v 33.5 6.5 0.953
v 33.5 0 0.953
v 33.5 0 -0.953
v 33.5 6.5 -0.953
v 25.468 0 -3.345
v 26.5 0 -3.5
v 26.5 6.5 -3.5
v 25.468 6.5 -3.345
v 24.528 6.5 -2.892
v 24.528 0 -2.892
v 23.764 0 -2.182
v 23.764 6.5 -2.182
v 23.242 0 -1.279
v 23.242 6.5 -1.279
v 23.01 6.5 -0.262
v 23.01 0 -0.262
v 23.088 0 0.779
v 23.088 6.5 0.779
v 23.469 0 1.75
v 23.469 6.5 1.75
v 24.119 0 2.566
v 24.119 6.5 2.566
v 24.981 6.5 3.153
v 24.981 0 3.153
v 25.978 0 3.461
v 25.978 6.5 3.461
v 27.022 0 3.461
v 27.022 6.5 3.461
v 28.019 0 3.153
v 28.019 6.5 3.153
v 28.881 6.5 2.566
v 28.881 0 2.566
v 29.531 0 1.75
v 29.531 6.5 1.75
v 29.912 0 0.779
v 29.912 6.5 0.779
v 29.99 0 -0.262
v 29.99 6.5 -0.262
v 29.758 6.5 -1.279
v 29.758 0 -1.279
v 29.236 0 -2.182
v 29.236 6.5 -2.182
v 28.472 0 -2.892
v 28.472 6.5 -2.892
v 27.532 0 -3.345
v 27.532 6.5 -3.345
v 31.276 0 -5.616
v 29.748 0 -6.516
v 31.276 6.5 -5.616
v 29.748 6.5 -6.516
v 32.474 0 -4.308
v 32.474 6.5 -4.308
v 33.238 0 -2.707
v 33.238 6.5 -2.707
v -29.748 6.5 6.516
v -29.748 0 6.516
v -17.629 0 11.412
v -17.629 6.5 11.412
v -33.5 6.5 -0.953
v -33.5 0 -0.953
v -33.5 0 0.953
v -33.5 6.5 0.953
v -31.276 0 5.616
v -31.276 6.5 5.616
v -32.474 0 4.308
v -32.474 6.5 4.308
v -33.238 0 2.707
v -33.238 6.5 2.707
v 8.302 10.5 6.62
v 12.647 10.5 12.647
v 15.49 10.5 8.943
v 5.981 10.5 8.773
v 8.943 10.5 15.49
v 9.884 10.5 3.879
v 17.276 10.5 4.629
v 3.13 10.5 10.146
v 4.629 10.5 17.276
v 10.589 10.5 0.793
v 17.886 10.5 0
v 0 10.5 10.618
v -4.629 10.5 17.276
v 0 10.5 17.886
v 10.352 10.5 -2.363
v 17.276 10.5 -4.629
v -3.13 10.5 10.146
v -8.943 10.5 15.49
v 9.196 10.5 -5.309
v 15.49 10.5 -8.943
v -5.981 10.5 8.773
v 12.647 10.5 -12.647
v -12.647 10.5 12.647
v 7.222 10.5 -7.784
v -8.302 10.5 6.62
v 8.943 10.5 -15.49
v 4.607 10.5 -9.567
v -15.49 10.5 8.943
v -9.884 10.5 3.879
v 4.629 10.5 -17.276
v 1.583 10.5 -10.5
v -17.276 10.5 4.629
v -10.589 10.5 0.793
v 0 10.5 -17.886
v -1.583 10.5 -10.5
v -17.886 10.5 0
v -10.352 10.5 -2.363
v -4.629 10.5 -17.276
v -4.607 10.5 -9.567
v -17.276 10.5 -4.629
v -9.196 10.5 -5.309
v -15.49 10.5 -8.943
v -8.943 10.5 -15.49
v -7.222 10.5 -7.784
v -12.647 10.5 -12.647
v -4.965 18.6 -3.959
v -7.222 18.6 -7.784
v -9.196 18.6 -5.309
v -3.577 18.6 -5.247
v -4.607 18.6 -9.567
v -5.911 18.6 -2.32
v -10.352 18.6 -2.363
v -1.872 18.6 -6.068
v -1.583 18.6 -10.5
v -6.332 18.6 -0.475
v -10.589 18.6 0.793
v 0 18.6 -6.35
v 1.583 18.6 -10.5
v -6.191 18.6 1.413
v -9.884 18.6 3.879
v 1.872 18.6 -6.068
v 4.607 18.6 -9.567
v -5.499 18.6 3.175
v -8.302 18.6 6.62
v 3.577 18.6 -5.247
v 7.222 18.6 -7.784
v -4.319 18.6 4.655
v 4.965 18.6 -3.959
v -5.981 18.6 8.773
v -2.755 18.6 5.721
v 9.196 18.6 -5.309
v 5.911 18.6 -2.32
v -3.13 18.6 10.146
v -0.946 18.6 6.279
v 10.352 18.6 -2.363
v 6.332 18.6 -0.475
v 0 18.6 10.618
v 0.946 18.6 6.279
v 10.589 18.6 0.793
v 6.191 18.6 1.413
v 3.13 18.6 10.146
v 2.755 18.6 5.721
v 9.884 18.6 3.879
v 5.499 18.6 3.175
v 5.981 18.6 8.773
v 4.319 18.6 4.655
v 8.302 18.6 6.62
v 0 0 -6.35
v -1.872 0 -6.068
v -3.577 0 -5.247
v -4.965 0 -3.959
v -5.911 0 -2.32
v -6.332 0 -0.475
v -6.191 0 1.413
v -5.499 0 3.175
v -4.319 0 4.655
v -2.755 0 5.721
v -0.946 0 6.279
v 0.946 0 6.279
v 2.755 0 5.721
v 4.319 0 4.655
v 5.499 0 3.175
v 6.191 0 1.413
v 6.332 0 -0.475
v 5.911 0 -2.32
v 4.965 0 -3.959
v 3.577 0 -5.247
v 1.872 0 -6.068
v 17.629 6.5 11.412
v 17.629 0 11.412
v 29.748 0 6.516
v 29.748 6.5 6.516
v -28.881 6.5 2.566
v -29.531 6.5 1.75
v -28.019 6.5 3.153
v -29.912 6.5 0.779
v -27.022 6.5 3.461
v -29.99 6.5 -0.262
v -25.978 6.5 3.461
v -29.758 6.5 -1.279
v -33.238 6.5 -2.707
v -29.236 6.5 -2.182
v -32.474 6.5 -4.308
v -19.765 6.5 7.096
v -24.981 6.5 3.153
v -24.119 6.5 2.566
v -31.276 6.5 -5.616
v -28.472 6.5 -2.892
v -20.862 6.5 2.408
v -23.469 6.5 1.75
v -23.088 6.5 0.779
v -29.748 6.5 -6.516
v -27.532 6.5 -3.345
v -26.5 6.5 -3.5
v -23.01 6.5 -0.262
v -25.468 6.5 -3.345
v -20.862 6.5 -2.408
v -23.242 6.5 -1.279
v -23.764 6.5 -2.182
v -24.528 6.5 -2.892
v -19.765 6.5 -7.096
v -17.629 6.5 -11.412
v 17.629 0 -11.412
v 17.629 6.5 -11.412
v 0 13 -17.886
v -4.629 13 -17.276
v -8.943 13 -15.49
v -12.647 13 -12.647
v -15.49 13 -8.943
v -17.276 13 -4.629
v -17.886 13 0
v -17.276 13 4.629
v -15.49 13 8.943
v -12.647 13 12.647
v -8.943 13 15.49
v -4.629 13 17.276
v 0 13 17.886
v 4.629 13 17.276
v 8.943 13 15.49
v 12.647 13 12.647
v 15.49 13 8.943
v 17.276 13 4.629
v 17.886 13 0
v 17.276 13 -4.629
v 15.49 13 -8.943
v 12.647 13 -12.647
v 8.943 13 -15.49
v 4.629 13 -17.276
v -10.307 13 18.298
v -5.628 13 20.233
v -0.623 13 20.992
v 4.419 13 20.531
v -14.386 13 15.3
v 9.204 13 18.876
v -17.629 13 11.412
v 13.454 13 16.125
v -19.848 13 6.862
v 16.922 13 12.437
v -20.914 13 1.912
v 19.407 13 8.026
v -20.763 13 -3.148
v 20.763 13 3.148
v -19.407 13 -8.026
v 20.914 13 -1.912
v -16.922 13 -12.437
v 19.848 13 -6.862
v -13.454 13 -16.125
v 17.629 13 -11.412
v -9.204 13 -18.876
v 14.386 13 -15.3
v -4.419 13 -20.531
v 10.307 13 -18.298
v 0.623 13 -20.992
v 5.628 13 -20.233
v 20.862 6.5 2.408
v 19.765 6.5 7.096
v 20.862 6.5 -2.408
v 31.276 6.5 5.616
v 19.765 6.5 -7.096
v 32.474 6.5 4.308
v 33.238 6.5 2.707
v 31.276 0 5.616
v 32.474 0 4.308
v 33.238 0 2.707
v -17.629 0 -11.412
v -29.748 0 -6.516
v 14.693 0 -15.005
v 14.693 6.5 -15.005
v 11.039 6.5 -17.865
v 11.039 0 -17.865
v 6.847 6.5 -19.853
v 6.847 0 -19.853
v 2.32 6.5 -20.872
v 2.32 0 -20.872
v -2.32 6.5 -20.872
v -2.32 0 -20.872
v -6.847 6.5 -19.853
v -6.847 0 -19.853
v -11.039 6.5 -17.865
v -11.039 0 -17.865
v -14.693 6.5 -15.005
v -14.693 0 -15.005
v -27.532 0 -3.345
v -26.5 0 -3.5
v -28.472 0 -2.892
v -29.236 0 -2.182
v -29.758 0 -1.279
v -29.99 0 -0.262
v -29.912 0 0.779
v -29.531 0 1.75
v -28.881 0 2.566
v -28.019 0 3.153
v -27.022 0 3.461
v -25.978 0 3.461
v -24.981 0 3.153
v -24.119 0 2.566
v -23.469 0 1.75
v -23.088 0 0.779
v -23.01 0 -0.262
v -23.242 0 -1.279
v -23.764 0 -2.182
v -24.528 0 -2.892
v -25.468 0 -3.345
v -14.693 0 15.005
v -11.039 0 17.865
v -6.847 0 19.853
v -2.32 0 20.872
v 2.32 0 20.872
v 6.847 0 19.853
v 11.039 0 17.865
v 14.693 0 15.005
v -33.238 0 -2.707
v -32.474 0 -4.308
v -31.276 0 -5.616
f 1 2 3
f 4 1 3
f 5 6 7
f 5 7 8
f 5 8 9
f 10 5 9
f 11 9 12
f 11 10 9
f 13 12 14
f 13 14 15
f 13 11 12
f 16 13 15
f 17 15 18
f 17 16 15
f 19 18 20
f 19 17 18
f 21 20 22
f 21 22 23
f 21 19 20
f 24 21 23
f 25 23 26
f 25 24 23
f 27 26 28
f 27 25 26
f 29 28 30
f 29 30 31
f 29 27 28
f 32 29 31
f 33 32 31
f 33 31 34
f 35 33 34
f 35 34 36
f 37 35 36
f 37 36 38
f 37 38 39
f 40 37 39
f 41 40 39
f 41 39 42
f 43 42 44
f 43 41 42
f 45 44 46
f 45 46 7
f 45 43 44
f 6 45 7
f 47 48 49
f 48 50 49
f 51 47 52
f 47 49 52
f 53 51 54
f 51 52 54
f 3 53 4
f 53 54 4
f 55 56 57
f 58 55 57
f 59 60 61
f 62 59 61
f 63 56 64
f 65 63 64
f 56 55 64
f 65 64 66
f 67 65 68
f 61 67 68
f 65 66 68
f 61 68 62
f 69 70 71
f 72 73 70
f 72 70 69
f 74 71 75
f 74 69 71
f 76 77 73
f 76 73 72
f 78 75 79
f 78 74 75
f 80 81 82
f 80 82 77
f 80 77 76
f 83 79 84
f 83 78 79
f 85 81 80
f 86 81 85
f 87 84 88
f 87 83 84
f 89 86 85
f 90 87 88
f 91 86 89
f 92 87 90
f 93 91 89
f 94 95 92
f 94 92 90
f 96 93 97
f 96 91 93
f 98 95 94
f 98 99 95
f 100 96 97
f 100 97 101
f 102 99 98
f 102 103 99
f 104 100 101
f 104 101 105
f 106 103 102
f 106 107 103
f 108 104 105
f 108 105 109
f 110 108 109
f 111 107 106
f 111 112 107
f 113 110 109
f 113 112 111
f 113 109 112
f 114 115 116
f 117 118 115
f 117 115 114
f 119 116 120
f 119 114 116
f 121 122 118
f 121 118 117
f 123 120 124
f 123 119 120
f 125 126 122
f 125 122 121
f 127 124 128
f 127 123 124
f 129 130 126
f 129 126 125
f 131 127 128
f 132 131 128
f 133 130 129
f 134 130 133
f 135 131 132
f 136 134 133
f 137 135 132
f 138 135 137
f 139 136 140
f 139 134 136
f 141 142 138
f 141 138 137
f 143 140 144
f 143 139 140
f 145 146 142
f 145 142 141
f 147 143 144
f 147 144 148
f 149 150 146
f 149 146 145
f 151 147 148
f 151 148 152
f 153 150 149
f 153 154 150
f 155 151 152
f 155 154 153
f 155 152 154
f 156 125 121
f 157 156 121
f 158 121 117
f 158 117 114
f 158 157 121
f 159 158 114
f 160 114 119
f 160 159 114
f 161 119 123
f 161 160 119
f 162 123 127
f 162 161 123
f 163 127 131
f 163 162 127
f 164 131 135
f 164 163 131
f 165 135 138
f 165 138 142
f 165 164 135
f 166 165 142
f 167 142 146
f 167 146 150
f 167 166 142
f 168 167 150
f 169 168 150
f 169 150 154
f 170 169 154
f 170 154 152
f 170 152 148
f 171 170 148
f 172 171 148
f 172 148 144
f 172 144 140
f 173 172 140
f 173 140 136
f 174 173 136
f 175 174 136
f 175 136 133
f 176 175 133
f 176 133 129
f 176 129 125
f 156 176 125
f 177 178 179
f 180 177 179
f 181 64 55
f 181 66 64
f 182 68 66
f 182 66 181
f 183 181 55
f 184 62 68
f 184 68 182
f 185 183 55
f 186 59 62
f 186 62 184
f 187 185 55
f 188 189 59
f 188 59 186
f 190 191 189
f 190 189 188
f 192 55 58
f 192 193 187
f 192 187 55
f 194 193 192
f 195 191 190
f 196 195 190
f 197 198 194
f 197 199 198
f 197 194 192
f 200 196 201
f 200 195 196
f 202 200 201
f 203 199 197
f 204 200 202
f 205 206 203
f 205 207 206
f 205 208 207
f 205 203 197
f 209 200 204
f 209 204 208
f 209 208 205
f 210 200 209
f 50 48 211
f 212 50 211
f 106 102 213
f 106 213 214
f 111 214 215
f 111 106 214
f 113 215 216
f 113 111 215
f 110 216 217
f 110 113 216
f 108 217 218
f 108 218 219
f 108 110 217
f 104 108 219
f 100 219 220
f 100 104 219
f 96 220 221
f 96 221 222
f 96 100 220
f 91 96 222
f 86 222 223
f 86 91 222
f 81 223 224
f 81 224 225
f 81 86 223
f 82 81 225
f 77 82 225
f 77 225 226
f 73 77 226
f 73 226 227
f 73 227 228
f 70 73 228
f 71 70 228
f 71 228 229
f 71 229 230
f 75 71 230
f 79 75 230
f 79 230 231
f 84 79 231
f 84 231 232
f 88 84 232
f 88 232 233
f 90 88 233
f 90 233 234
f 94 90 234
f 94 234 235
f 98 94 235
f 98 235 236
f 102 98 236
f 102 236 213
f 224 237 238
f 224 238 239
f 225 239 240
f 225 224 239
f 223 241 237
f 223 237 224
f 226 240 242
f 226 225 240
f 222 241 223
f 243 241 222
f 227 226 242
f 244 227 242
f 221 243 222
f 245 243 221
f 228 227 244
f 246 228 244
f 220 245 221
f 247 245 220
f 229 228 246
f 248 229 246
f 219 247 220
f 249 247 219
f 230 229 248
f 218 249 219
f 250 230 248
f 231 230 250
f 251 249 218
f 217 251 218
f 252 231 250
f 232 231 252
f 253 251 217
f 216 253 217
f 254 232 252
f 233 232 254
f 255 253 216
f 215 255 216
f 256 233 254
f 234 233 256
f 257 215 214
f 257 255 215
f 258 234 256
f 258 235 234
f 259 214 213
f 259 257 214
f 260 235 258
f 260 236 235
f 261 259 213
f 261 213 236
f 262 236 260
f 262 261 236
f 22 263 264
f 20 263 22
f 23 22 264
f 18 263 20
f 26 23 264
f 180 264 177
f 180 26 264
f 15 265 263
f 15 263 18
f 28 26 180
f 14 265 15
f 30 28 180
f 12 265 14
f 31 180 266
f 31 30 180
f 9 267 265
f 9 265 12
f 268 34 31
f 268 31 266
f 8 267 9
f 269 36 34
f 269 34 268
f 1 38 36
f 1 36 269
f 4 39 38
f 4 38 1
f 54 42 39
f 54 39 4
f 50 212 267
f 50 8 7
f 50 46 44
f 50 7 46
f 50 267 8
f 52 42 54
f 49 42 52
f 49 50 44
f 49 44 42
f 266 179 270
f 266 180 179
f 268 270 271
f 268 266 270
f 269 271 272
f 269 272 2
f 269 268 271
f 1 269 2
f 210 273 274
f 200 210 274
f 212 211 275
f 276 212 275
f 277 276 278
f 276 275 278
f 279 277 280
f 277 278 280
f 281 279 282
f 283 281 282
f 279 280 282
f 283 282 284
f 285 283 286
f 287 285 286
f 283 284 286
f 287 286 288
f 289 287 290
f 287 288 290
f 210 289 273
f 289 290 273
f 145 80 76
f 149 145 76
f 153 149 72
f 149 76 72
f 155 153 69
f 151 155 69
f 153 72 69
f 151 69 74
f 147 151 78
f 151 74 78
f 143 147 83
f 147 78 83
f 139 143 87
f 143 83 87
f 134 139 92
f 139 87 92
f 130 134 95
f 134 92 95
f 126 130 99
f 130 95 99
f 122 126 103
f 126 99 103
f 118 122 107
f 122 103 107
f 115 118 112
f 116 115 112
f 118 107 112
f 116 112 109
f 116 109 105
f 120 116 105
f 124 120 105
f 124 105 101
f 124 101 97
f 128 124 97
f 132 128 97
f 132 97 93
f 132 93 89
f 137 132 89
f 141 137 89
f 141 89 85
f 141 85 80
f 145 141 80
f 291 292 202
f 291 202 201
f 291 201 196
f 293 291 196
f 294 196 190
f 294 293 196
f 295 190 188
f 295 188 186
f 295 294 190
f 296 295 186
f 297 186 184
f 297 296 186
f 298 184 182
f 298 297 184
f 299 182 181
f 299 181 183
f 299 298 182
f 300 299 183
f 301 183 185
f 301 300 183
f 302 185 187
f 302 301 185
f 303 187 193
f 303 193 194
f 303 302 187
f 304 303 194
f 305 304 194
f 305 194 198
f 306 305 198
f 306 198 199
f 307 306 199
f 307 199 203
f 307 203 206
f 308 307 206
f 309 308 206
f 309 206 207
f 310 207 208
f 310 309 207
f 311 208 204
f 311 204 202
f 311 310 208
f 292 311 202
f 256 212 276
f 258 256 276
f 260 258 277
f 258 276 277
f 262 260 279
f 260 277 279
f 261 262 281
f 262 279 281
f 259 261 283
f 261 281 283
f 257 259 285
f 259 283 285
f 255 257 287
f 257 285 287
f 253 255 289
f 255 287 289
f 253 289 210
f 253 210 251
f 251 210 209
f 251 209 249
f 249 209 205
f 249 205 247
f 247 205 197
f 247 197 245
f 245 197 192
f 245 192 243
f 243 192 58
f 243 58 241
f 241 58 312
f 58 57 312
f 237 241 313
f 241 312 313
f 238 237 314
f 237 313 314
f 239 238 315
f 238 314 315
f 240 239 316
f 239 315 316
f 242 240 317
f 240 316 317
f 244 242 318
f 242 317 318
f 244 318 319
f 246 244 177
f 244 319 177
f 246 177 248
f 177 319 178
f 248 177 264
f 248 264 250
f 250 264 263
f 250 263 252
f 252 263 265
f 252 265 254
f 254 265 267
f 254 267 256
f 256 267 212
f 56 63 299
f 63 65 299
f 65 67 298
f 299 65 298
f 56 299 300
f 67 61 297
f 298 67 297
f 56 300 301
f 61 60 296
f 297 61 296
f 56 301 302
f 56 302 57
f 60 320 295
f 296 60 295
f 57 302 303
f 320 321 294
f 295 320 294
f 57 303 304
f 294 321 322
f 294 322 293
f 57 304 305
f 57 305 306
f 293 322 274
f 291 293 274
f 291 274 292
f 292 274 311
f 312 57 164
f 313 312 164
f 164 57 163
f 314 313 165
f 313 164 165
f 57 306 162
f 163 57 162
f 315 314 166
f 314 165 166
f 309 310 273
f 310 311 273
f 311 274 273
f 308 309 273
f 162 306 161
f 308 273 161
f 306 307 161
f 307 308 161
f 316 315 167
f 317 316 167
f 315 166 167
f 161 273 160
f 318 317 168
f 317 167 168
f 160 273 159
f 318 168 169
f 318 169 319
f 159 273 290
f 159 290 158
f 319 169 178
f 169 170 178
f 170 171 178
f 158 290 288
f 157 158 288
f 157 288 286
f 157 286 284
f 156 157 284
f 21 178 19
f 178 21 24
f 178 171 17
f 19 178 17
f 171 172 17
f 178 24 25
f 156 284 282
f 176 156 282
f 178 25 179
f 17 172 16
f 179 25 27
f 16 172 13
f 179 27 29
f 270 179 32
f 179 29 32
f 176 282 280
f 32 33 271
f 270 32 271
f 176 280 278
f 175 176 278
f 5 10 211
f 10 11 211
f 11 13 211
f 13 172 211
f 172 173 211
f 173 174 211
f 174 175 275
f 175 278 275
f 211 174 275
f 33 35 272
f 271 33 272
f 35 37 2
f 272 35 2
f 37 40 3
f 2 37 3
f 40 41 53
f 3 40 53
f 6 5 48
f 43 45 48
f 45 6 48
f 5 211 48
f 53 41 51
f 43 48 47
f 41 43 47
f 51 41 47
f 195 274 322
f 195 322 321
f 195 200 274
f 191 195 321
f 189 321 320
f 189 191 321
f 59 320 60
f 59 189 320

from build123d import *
from build123d.topology import SkipClean

# Parameters (mm, degrees)
SKETCH1_R           = 3.5
SKETCH1_R_2         = 21.000776116
SKETCH1_R_3         = 6.35
BOSS_EXTRUDE1_DEPTH = 6.5
SKETCH2_R           = 21.000776116
SKETCH2_R_2         = 17.885901882
BOSS_EXTRUDE2_DEPTH = 6.5
SKETCH3_R           = 10.618204783
SKETCH3_R_2         = 6.35
BOSS_EXTRUDE3_DEPTH = 12.1
SKETCH4_R           = 17.885901882
SKETCH4_R_2         = 10.618204783
BOSS_EXTRUDE5_DEPTH = 4
FILLET1_R           = 6


with BuildPart() as part:
    # Sketch1 → Boss-Extrude1 (new body)
    # profile 1 of 3: a face of its own
    with BuildSketch(Plane(origin=(0, 0, 0), x_dir=(1, 0, 0), z_dir=(0, 1, 0))):
        with BuildLine():
            Line((-33.5, 5), (-33.5, 0))
            Line((-33.5, 0), (-33.5, -5))
            Line((-33.5, -5), (-17.629397896, -11.41213947))
            ThreePointArc((-17.629397896, -11.41213947), (-21.000776116, 0), (-17.629397896, 11.41213947))
            Line((-17.629397896, 11.41213947), (-33.5, 5))
        make_face()
        with Locations(Location((-26.5, 0, 0), (0, 0, 90))):
            Circle(SKETCH1_R, mode=Mode.SUBTRACT)
    # profile 2 of 3: a face of its own
    with BuildSketch(Plane(origin=(0, 0, 0), x_dir=(1, 0, 0), z_dir=(0, 1, 0))):
        Circle(SKETCH1_R_2)
        with Locations(Location((0, 0, 0), (0, 0, 90))):
            Circle(SKETCH1_R_3, mode=Mode.SUBTRACT)
    # profile 3 of 3: a face of its own
    with BuildSketch(Plane(origin=(0, 0, 0), x_dir=(1, 0, 0), z_dir=(0, 1, 0))):
        with BuildLine():
            Line((33.5, 5), (17.629397896, 11.41213947))
            ThreePointArc((17.629397896, 11.41213947), (20.140303321, 5.949855426), (21.000776116, 0))
            ThreePointArc((21.000776116, 0), (20.140303321, -5.949855426), (17.629397896, -11.41213947))
            Line((17.629397896, -11.41213947), (33.5, -5))
            Line((33.5, -5), (33.5, 0))
            Line((33.5, 0), (33.5, 5))
        make_face()
        with Locations(Location((26.5, 0, 0), (0, 0, 90))):
            Circle(SKETCH1_R, mode=Mode.SUBTRACT)
    extrude(amount=BOSS_EXTRUDE1_DEPTH)

    # Sketch2 → Boss-Extrude2 (add)
    with BuildSketch(Plane(origin=(0, 6.5, 0), x_dir=(1, 0, 0), z_dir=(0, 1, 0))):
        with Locations(Location((0, 0, 0), (0, 0, 32.916425521))):
            Circle(SKETCH2_R)
        with Locations(Location((0, 0, 0), (0, 0, 90))):
            Circle(SKETCH2_R_2, mode=Mode.SUBTRACT)
    extrude(amount=BOSS_EXTRUDE2_DEPTH)

    # Sketch3 → Boss-Extrude3 (add)
    with SkipClean():  # the faces are left unmerged after this step: merging them gives an invalid solid
        with BuildSketch(Plane(origin=(0, 6.5, 0), x_dir=(1, 0, 0), z_dir=(0, 1, 0))):
            with Locations(Location((0, 0, 0), (0, 0, 270))):
                Circle(SKETCH3_R)
            with Locations(Location((0, 0, 0), (0, 0, 90))):
                Circle(SKETCH3_R_2, mode=Mode.SUBTRACT)
        extrude(amount=BOSS_EXTRUDE3_DEPTH)

    # Sketch4 → Boss-Extrude5 (add)
    with SkipClean():  # the faces are left unmerged after this step: merging them gives an invalid solid
        with BuildSketch(Plane(origin=(0, 6.5, 0), x_dir=(1, 0, 0), z_dir=(0, 1, 0))):
            with Locations(Location((0, 0, 0), (0, 0, 90))):
                Circle(SKETCH4_R)
            with Locations(Location((0, 0, 0), (0, 0, 270))):
                Circle(SKETCH4_R_2, mode=Mode.SUBTRACT)
        extrude(amount=BOSS_EXTRUDE5_DEPTH)

    # Fillet1
    fillet1_edges = [part.edges().sort_by_distance(p)[0] for p in [
        (33.5, 3.25, 5),
        (33.5, 3.25, -5),
        (-33.5, 3.25, 5),
        (-33.5, 3.25, -5),
    ]]
    fillet(fillet1_edges, radius=FILLET1_R)


solid = part.part
